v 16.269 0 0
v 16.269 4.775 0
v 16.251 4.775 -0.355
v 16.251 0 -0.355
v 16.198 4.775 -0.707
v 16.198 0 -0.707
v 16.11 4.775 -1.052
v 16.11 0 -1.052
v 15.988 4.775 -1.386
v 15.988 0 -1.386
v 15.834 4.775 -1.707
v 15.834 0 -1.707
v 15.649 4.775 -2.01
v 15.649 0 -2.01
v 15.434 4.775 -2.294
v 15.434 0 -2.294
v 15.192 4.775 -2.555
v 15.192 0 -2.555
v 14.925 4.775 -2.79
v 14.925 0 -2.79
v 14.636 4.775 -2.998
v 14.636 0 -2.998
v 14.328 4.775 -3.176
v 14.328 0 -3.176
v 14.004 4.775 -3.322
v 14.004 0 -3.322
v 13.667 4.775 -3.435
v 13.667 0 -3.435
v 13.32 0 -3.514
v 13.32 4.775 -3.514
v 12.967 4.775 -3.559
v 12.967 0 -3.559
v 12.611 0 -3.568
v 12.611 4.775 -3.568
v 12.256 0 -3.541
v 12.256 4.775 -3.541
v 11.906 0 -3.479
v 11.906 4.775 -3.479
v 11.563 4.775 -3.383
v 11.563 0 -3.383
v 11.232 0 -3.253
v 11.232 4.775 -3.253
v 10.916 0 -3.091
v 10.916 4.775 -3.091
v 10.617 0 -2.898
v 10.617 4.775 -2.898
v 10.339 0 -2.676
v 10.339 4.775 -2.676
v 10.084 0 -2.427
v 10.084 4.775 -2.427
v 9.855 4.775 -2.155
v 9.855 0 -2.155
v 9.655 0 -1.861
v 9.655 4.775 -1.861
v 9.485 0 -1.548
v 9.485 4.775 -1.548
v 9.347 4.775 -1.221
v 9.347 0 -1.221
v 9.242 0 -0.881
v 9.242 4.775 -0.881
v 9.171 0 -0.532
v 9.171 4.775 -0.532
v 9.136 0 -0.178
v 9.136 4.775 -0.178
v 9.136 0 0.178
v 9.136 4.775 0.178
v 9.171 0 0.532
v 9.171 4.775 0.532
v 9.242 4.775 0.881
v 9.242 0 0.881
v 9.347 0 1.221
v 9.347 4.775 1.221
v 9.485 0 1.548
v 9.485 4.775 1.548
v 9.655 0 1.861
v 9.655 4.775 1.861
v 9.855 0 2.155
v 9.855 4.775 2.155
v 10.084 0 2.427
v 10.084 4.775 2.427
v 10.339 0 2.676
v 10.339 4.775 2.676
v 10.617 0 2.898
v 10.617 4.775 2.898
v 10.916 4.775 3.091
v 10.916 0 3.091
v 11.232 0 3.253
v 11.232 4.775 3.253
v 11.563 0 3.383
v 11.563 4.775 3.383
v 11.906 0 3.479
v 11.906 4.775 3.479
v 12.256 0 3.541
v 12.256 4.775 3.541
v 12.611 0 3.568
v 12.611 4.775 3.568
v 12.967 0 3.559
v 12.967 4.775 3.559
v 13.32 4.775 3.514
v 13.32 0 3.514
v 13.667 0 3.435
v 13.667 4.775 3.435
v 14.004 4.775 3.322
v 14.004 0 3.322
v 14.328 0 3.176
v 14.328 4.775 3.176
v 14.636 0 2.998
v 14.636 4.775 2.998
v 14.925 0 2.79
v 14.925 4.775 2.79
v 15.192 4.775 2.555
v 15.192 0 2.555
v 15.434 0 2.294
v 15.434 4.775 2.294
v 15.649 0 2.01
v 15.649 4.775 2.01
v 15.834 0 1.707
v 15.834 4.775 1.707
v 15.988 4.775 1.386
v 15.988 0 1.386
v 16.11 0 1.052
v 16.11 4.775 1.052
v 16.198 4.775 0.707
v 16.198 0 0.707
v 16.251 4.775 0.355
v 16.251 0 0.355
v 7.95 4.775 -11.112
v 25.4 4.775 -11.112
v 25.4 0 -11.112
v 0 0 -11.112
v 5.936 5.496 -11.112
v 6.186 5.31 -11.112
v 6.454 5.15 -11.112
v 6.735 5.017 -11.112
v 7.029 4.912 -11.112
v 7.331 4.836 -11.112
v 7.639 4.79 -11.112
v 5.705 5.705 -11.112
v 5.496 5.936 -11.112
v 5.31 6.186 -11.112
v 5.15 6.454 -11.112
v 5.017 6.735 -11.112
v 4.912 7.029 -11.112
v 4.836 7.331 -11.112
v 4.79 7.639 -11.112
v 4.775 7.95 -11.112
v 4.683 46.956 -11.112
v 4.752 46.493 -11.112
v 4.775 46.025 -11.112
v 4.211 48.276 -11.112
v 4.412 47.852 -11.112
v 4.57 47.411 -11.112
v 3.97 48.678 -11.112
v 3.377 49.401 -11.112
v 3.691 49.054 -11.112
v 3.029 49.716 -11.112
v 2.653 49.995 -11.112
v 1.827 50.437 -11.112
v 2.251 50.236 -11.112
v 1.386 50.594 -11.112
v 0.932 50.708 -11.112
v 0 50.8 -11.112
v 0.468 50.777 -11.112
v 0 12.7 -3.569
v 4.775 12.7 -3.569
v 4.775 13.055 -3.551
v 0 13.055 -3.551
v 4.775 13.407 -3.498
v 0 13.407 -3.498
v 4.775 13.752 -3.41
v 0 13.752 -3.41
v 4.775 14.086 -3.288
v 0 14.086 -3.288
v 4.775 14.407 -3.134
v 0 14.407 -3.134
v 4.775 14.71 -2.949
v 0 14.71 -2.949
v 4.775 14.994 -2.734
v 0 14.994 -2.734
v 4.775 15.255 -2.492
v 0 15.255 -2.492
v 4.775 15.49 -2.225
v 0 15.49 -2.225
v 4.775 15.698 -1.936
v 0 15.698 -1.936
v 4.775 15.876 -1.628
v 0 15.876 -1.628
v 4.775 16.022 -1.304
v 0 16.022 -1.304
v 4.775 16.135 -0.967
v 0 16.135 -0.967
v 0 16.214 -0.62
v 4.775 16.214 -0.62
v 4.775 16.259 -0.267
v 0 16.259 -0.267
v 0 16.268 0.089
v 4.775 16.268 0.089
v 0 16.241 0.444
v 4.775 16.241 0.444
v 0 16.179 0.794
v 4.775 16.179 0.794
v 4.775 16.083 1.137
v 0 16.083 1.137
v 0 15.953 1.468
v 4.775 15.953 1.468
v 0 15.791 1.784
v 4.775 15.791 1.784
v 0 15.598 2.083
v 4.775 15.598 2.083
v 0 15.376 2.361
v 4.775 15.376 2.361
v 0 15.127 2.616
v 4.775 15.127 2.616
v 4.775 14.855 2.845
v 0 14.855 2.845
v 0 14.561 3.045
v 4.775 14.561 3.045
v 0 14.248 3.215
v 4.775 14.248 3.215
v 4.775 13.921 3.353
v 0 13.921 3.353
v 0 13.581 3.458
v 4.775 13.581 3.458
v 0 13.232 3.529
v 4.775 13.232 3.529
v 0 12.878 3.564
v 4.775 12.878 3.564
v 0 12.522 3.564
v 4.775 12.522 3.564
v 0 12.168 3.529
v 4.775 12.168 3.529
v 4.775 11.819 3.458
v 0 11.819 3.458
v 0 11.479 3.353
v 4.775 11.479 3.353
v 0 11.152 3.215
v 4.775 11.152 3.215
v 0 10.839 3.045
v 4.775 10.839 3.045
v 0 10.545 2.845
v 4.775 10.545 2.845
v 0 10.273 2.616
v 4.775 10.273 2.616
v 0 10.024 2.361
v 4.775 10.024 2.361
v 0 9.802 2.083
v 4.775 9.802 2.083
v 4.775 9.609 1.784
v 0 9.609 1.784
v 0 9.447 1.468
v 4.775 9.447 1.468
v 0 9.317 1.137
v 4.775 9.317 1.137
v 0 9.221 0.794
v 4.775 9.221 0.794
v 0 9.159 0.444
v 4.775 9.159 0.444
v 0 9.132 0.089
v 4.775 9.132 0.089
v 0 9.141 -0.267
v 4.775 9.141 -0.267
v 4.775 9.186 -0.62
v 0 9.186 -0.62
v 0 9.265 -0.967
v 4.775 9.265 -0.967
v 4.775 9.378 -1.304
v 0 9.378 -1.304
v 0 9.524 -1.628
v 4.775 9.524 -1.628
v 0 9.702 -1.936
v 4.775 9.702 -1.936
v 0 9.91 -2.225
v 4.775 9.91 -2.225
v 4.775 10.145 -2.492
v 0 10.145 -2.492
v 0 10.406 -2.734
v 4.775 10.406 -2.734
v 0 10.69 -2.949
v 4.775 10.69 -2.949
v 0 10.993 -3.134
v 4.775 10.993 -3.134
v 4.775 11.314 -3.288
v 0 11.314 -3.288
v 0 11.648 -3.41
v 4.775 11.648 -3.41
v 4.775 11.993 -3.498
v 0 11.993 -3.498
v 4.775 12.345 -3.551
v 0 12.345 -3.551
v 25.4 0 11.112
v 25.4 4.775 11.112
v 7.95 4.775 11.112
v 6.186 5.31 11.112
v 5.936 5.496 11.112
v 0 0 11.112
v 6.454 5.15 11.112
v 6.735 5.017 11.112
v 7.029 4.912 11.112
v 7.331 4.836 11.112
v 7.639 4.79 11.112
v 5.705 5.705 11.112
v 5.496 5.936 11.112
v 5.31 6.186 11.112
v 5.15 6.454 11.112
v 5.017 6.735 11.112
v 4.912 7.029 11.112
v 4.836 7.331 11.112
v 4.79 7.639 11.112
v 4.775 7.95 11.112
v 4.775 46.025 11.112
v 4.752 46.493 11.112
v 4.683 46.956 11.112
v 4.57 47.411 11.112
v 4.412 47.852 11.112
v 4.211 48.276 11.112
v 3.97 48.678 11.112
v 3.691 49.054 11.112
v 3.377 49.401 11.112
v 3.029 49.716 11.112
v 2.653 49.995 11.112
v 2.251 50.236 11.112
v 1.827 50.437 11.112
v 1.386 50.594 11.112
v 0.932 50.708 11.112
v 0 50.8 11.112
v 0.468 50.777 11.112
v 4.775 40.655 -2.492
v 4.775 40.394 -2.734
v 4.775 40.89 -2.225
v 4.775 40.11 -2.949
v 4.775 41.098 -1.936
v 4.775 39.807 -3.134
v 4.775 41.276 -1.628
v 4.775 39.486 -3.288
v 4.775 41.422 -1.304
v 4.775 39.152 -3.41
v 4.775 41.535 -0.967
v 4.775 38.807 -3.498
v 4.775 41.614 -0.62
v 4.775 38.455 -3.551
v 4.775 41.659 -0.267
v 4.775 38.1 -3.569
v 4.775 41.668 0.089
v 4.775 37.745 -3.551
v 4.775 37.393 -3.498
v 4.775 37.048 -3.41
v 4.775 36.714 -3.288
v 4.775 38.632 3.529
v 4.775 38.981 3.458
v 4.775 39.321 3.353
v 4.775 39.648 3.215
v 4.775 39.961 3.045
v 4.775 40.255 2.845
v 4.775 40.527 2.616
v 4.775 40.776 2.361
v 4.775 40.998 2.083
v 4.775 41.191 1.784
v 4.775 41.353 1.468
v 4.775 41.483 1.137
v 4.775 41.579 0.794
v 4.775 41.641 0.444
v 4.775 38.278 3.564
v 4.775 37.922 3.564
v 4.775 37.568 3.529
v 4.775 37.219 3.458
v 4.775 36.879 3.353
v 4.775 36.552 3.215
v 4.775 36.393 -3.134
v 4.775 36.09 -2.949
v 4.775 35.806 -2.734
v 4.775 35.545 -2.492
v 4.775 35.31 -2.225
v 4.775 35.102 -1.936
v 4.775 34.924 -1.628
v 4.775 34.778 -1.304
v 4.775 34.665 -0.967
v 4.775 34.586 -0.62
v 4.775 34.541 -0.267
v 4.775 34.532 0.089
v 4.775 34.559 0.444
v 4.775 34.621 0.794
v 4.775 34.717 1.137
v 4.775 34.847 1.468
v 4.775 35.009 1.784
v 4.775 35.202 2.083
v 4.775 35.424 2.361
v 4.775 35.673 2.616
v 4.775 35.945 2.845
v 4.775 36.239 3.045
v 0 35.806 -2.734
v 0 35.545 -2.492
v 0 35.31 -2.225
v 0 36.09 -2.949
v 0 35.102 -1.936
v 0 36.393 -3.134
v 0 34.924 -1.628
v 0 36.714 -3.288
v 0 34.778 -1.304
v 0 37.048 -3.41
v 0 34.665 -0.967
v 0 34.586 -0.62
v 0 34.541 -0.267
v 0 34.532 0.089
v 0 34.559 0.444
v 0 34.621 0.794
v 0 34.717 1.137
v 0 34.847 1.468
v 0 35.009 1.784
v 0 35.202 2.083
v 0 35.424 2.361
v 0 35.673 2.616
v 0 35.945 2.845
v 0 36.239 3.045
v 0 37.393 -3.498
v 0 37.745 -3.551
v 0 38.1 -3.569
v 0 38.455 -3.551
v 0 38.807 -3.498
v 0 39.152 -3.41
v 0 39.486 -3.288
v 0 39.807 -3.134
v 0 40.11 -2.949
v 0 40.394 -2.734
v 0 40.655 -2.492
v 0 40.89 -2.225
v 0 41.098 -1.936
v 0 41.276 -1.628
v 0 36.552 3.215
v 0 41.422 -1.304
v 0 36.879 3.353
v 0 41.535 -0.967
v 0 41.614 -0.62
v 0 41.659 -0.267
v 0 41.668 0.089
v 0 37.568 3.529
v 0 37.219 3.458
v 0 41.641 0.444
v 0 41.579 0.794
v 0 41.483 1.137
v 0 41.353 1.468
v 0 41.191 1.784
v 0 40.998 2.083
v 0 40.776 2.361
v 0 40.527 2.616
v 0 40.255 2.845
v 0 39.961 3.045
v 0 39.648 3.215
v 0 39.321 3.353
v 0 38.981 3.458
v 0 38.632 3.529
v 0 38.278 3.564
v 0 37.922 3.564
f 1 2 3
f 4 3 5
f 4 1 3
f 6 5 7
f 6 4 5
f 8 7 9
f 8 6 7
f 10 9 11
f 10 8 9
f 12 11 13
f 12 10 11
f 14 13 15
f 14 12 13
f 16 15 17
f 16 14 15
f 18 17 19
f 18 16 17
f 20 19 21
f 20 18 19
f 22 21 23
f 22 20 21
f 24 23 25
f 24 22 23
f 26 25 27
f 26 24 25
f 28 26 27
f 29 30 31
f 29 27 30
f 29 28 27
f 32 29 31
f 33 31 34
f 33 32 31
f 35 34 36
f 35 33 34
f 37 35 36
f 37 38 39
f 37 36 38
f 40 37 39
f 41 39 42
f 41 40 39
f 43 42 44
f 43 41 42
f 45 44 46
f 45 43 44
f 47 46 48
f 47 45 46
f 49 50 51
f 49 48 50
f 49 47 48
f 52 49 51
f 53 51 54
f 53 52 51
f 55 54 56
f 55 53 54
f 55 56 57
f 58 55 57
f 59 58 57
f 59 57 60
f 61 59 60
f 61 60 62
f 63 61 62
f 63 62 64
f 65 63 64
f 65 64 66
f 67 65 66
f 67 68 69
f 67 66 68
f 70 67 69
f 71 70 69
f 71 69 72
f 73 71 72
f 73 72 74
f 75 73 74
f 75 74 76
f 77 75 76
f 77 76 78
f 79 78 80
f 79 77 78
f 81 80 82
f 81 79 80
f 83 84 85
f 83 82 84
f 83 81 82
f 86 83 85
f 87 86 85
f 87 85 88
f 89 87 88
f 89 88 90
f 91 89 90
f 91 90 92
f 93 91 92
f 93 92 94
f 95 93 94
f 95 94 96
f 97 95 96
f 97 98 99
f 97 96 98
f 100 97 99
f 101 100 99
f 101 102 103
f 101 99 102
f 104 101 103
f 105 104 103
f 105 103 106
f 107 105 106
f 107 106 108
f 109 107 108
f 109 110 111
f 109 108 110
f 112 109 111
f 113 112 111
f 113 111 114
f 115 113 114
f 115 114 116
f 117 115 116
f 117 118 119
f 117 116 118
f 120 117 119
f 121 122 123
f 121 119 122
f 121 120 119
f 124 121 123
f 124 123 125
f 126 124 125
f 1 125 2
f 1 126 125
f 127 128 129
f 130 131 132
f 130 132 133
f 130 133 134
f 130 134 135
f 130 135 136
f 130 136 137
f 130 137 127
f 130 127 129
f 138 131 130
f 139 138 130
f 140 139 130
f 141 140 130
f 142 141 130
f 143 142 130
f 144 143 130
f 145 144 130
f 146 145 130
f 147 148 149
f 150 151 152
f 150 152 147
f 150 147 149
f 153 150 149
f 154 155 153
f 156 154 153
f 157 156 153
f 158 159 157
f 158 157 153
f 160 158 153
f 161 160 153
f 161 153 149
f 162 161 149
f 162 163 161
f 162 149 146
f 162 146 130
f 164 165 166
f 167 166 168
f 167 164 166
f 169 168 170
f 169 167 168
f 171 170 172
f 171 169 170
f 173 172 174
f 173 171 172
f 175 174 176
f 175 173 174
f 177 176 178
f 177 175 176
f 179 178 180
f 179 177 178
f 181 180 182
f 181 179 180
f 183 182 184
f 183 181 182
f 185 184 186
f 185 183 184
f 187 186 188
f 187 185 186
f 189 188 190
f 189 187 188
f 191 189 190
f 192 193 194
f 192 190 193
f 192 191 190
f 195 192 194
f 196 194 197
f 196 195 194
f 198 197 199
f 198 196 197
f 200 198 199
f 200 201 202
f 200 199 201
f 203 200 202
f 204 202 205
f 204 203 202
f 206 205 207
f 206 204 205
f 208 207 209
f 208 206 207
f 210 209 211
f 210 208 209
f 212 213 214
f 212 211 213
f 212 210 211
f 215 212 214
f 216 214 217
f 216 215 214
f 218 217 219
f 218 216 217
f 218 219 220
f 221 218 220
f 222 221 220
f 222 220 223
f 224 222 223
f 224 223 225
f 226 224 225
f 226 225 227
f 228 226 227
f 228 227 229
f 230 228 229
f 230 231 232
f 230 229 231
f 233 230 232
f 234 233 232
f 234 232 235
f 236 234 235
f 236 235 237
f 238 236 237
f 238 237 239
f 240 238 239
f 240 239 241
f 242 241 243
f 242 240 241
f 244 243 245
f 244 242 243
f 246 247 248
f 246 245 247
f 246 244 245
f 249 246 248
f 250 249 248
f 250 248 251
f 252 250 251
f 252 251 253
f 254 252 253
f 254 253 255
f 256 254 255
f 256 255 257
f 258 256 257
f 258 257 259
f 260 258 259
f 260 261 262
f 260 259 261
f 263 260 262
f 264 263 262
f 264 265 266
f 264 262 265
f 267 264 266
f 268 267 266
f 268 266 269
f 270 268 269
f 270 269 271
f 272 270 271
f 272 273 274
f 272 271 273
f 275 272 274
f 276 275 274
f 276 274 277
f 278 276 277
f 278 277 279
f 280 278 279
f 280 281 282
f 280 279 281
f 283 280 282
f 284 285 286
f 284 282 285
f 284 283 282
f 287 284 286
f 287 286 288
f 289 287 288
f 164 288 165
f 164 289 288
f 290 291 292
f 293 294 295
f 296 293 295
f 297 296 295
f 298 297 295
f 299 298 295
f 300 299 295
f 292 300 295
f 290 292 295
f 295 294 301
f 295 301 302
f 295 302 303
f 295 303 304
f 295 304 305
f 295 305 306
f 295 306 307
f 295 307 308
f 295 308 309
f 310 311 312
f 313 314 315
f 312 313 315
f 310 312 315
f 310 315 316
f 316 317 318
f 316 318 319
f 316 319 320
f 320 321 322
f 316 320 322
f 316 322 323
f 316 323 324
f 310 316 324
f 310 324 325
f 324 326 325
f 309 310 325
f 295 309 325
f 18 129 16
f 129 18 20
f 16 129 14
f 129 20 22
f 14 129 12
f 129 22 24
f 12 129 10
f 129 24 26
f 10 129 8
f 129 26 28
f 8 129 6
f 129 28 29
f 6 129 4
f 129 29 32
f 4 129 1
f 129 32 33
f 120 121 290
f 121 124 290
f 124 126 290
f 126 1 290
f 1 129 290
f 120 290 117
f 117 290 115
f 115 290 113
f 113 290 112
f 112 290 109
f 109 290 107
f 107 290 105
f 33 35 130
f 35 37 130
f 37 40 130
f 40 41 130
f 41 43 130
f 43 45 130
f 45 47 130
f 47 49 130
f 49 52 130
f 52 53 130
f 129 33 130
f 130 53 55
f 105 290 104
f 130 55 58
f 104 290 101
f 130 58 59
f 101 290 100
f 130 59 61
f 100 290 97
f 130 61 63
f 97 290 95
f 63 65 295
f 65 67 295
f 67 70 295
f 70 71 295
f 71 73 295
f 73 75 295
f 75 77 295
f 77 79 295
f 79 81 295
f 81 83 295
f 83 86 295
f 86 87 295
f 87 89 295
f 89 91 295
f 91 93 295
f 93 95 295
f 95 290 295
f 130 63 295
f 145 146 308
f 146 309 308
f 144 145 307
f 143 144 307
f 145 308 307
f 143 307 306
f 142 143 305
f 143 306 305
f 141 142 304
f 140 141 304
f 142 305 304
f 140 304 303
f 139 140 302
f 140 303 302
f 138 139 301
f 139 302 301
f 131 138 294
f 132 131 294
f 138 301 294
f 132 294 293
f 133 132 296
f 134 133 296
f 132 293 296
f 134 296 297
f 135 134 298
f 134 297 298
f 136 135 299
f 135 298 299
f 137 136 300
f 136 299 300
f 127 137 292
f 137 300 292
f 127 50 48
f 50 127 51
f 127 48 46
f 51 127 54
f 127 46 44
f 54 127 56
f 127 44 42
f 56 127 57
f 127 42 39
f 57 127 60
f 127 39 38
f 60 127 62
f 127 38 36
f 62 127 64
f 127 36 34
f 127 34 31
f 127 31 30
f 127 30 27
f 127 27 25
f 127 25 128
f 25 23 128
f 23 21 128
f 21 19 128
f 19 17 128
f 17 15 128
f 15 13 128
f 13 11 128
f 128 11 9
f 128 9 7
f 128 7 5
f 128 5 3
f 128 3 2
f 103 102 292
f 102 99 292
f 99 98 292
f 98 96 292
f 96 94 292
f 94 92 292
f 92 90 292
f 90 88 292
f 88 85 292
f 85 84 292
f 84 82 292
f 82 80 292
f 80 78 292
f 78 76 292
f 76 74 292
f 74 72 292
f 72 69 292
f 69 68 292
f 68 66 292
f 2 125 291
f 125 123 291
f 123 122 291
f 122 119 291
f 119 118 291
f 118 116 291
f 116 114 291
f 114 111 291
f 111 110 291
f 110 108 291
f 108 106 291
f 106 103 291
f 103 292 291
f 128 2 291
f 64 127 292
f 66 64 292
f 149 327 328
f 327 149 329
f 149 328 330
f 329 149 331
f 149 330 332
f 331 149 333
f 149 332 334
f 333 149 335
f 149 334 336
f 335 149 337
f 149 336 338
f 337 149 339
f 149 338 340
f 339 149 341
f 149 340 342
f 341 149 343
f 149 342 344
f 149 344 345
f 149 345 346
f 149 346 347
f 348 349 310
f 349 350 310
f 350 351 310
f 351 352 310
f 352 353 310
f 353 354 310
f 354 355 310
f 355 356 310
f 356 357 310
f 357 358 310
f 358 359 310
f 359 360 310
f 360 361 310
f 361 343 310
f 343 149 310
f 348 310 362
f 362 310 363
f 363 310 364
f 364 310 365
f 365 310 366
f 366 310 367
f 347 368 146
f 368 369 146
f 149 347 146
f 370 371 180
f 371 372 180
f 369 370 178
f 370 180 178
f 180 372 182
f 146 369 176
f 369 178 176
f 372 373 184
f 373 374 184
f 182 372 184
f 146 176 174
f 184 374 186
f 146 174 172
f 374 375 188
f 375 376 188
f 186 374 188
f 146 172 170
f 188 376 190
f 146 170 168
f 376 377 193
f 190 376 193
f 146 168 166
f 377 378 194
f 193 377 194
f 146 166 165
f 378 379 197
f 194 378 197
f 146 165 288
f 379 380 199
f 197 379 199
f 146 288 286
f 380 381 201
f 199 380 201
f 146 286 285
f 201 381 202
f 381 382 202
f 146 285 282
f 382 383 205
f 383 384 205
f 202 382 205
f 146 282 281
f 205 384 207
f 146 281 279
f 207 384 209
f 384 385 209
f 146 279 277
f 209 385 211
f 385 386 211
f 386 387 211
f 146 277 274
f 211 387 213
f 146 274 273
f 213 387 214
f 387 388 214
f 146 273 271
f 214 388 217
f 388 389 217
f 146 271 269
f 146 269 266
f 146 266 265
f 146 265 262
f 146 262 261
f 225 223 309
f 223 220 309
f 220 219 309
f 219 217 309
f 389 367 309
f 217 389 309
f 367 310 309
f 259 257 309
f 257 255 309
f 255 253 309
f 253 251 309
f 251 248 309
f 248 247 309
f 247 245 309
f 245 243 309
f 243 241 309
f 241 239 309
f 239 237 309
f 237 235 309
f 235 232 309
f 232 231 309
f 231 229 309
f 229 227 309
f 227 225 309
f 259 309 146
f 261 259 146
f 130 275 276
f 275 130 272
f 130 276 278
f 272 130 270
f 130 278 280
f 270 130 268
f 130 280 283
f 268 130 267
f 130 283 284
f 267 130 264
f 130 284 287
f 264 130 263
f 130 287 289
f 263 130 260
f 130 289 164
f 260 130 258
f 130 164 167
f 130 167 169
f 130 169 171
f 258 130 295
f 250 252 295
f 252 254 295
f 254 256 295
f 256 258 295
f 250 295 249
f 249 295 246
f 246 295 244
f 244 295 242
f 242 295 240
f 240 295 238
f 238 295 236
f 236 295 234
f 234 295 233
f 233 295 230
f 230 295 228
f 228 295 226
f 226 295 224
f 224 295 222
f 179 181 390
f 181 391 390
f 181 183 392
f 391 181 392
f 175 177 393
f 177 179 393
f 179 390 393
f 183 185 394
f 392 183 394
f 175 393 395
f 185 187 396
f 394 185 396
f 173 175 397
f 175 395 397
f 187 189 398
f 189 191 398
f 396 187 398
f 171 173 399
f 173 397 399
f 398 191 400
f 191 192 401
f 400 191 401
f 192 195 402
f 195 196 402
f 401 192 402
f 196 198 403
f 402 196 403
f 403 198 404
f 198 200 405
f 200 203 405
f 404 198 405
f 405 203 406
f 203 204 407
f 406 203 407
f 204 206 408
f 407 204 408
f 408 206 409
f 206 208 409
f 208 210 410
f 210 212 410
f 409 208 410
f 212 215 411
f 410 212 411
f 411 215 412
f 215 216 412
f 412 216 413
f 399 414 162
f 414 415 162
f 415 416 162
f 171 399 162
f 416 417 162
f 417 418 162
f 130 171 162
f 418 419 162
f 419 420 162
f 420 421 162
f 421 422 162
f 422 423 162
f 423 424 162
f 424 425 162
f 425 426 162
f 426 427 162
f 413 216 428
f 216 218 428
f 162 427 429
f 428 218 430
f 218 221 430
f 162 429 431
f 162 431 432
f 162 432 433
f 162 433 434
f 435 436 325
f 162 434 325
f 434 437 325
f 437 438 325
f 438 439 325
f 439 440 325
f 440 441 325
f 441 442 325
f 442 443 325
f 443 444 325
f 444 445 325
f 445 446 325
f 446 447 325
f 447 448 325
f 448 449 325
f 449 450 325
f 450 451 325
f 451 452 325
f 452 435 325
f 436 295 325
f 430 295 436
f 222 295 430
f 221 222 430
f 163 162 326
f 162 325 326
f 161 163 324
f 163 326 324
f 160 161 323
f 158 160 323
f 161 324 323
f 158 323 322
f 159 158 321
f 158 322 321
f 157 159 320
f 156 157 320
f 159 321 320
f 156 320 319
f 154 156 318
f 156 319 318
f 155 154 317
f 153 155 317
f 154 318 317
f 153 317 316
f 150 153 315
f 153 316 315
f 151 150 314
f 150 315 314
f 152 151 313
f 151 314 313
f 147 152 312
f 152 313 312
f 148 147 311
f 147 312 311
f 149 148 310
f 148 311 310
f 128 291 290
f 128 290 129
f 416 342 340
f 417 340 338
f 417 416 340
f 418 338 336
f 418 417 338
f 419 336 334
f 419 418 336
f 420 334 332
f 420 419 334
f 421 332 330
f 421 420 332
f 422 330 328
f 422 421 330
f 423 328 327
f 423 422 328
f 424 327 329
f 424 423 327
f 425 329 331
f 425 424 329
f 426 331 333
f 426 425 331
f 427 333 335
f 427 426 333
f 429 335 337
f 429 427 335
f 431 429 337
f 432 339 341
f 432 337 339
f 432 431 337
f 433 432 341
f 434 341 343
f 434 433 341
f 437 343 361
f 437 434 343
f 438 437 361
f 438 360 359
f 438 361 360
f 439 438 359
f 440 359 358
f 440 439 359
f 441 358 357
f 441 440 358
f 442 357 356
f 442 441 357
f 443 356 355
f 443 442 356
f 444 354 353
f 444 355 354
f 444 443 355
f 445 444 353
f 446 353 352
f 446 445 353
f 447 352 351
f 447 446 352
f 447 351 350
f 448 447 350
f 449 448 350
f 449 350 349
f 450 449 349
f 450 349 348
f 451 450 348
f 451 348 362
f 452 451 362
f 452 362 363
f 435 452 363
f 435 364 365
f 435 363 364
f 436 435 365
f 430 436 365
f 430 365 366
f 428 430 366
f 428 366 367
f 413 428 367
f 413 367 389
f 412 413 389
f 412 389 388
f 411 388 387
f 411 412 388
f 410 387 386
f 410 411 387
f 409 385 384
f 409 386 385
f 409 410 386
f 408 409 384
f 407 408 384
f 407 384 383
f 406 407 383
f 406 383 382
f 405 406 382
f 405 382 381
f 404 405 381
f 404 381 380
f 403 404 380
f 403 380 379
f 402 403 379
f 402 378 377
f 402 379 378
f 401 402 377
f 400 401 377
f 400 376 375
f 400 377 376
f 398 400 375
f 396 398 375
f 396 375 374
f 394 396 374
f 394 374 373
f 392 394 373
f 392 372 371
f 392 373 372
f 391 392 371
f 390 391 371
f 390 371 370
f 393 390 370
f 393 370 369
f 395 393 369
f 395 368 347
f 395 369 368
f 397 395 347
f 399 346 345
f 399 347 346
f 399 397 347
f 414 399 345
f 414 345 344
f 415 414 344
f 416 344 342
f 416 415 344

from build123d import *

# Parameters (mm, degrees)
BOSS_EXTRUDE1_DEPTH = 11.1125
SKETCH2_R           = 3.5687
CUT_EXTRUDE1_DEPTH  = 51.8
SKETCH3_R           = 3.5687
CUT_EXTRUDE2_DEPTH  = 51.8
CUT_EXTRUDE3_REACH  = 6.775
SKETCH4_W           = 25.4
SKETCH4_H           = 22.225


with BuildPart() as part:
    # Sketch1 → Boss-Extrude1 (new body, symmetric)
    with BuildSketch(Plane.XY):
        with BuildLine():
            Line((0, 0), (0, 50.8))
            ThreePointArc((0, 50.8), (3.376576302, 49.401376302), (4.7752, 46.0248))
            Line((4.7752, 46.0248), (4.7752, 7.9502))
            ThreePointArc((4.7752, 7.9502), (5.70513597, 5.70513597), (7.9502, 4.7752))
            Line((7.9502, 4.7752), (46.0248, 4.7752))
            ThreePointArc((46.0248, 4.7752), (49.401376302, 3.376576302), (50.8, 0))
            Line((50.8, 0), (0, 0))
        make_face()
    extrude(amount=BOSS_EXTRUDE1_DEPTH, both=True)

    # Sketch2 → Cut-Extrude1 (cut, through all)
    with BuildSketch(Plane(origin=(0, 0, 0), x_dir=(1, 0, 0), z_dir=(0, 1, 0))):
        with Locations((12.7, 0)):
            Circle(SKETCH2_R)
        with Locations((38.1, 0)):
            Circle(SKETCH2_R)
    extrude(amount=CUT_EXTRUDE1_DEPTH, mode=Mode.SUBTRACT)

    # Sketch3 → Cut-Extrude2 (cut, through all)
    with BuildSketch(Plane(origin=(0, 0, 0), x_dir=(0, 0, -1), z_dir=(1, 0, 0))):
        with Locations((0, 12.7)):
            Circle(SKETCH3_R)
        with Locations((0, 38.1)):
            Circle(SKETCH3_R)
    extrude(amount=CUT_EXTRUDE2_DEPTH, mode=Mode.SUBTRACT)

    # Sketch4 → Cut-Extrude3 (cut, up to next)
    with BuildSketch(Plane(origin=(0, 4.7752, 0), x_dir=(1, 0, 0), z_dir=(0, 1, 0)), mode=Mode.PRIVATE) as cut_extrude3_sk1:
        with Locations((38.1, 0)):
            Rectangle(SKETCH4_W, SKETCH4_H)
    cut_extrude3_tool1 = extrude(cut_extrude3_sk1.sketch, amount=-CUT_EXTRUDE3_REACH, mode=Mode.PRIVATE) & part.part
    add(cut_extrude3_tool1.solids().sort_by_distance((38.1, 4.7752, 0))[0], mode=Mode.SUBTRACT)


solid = part.part
